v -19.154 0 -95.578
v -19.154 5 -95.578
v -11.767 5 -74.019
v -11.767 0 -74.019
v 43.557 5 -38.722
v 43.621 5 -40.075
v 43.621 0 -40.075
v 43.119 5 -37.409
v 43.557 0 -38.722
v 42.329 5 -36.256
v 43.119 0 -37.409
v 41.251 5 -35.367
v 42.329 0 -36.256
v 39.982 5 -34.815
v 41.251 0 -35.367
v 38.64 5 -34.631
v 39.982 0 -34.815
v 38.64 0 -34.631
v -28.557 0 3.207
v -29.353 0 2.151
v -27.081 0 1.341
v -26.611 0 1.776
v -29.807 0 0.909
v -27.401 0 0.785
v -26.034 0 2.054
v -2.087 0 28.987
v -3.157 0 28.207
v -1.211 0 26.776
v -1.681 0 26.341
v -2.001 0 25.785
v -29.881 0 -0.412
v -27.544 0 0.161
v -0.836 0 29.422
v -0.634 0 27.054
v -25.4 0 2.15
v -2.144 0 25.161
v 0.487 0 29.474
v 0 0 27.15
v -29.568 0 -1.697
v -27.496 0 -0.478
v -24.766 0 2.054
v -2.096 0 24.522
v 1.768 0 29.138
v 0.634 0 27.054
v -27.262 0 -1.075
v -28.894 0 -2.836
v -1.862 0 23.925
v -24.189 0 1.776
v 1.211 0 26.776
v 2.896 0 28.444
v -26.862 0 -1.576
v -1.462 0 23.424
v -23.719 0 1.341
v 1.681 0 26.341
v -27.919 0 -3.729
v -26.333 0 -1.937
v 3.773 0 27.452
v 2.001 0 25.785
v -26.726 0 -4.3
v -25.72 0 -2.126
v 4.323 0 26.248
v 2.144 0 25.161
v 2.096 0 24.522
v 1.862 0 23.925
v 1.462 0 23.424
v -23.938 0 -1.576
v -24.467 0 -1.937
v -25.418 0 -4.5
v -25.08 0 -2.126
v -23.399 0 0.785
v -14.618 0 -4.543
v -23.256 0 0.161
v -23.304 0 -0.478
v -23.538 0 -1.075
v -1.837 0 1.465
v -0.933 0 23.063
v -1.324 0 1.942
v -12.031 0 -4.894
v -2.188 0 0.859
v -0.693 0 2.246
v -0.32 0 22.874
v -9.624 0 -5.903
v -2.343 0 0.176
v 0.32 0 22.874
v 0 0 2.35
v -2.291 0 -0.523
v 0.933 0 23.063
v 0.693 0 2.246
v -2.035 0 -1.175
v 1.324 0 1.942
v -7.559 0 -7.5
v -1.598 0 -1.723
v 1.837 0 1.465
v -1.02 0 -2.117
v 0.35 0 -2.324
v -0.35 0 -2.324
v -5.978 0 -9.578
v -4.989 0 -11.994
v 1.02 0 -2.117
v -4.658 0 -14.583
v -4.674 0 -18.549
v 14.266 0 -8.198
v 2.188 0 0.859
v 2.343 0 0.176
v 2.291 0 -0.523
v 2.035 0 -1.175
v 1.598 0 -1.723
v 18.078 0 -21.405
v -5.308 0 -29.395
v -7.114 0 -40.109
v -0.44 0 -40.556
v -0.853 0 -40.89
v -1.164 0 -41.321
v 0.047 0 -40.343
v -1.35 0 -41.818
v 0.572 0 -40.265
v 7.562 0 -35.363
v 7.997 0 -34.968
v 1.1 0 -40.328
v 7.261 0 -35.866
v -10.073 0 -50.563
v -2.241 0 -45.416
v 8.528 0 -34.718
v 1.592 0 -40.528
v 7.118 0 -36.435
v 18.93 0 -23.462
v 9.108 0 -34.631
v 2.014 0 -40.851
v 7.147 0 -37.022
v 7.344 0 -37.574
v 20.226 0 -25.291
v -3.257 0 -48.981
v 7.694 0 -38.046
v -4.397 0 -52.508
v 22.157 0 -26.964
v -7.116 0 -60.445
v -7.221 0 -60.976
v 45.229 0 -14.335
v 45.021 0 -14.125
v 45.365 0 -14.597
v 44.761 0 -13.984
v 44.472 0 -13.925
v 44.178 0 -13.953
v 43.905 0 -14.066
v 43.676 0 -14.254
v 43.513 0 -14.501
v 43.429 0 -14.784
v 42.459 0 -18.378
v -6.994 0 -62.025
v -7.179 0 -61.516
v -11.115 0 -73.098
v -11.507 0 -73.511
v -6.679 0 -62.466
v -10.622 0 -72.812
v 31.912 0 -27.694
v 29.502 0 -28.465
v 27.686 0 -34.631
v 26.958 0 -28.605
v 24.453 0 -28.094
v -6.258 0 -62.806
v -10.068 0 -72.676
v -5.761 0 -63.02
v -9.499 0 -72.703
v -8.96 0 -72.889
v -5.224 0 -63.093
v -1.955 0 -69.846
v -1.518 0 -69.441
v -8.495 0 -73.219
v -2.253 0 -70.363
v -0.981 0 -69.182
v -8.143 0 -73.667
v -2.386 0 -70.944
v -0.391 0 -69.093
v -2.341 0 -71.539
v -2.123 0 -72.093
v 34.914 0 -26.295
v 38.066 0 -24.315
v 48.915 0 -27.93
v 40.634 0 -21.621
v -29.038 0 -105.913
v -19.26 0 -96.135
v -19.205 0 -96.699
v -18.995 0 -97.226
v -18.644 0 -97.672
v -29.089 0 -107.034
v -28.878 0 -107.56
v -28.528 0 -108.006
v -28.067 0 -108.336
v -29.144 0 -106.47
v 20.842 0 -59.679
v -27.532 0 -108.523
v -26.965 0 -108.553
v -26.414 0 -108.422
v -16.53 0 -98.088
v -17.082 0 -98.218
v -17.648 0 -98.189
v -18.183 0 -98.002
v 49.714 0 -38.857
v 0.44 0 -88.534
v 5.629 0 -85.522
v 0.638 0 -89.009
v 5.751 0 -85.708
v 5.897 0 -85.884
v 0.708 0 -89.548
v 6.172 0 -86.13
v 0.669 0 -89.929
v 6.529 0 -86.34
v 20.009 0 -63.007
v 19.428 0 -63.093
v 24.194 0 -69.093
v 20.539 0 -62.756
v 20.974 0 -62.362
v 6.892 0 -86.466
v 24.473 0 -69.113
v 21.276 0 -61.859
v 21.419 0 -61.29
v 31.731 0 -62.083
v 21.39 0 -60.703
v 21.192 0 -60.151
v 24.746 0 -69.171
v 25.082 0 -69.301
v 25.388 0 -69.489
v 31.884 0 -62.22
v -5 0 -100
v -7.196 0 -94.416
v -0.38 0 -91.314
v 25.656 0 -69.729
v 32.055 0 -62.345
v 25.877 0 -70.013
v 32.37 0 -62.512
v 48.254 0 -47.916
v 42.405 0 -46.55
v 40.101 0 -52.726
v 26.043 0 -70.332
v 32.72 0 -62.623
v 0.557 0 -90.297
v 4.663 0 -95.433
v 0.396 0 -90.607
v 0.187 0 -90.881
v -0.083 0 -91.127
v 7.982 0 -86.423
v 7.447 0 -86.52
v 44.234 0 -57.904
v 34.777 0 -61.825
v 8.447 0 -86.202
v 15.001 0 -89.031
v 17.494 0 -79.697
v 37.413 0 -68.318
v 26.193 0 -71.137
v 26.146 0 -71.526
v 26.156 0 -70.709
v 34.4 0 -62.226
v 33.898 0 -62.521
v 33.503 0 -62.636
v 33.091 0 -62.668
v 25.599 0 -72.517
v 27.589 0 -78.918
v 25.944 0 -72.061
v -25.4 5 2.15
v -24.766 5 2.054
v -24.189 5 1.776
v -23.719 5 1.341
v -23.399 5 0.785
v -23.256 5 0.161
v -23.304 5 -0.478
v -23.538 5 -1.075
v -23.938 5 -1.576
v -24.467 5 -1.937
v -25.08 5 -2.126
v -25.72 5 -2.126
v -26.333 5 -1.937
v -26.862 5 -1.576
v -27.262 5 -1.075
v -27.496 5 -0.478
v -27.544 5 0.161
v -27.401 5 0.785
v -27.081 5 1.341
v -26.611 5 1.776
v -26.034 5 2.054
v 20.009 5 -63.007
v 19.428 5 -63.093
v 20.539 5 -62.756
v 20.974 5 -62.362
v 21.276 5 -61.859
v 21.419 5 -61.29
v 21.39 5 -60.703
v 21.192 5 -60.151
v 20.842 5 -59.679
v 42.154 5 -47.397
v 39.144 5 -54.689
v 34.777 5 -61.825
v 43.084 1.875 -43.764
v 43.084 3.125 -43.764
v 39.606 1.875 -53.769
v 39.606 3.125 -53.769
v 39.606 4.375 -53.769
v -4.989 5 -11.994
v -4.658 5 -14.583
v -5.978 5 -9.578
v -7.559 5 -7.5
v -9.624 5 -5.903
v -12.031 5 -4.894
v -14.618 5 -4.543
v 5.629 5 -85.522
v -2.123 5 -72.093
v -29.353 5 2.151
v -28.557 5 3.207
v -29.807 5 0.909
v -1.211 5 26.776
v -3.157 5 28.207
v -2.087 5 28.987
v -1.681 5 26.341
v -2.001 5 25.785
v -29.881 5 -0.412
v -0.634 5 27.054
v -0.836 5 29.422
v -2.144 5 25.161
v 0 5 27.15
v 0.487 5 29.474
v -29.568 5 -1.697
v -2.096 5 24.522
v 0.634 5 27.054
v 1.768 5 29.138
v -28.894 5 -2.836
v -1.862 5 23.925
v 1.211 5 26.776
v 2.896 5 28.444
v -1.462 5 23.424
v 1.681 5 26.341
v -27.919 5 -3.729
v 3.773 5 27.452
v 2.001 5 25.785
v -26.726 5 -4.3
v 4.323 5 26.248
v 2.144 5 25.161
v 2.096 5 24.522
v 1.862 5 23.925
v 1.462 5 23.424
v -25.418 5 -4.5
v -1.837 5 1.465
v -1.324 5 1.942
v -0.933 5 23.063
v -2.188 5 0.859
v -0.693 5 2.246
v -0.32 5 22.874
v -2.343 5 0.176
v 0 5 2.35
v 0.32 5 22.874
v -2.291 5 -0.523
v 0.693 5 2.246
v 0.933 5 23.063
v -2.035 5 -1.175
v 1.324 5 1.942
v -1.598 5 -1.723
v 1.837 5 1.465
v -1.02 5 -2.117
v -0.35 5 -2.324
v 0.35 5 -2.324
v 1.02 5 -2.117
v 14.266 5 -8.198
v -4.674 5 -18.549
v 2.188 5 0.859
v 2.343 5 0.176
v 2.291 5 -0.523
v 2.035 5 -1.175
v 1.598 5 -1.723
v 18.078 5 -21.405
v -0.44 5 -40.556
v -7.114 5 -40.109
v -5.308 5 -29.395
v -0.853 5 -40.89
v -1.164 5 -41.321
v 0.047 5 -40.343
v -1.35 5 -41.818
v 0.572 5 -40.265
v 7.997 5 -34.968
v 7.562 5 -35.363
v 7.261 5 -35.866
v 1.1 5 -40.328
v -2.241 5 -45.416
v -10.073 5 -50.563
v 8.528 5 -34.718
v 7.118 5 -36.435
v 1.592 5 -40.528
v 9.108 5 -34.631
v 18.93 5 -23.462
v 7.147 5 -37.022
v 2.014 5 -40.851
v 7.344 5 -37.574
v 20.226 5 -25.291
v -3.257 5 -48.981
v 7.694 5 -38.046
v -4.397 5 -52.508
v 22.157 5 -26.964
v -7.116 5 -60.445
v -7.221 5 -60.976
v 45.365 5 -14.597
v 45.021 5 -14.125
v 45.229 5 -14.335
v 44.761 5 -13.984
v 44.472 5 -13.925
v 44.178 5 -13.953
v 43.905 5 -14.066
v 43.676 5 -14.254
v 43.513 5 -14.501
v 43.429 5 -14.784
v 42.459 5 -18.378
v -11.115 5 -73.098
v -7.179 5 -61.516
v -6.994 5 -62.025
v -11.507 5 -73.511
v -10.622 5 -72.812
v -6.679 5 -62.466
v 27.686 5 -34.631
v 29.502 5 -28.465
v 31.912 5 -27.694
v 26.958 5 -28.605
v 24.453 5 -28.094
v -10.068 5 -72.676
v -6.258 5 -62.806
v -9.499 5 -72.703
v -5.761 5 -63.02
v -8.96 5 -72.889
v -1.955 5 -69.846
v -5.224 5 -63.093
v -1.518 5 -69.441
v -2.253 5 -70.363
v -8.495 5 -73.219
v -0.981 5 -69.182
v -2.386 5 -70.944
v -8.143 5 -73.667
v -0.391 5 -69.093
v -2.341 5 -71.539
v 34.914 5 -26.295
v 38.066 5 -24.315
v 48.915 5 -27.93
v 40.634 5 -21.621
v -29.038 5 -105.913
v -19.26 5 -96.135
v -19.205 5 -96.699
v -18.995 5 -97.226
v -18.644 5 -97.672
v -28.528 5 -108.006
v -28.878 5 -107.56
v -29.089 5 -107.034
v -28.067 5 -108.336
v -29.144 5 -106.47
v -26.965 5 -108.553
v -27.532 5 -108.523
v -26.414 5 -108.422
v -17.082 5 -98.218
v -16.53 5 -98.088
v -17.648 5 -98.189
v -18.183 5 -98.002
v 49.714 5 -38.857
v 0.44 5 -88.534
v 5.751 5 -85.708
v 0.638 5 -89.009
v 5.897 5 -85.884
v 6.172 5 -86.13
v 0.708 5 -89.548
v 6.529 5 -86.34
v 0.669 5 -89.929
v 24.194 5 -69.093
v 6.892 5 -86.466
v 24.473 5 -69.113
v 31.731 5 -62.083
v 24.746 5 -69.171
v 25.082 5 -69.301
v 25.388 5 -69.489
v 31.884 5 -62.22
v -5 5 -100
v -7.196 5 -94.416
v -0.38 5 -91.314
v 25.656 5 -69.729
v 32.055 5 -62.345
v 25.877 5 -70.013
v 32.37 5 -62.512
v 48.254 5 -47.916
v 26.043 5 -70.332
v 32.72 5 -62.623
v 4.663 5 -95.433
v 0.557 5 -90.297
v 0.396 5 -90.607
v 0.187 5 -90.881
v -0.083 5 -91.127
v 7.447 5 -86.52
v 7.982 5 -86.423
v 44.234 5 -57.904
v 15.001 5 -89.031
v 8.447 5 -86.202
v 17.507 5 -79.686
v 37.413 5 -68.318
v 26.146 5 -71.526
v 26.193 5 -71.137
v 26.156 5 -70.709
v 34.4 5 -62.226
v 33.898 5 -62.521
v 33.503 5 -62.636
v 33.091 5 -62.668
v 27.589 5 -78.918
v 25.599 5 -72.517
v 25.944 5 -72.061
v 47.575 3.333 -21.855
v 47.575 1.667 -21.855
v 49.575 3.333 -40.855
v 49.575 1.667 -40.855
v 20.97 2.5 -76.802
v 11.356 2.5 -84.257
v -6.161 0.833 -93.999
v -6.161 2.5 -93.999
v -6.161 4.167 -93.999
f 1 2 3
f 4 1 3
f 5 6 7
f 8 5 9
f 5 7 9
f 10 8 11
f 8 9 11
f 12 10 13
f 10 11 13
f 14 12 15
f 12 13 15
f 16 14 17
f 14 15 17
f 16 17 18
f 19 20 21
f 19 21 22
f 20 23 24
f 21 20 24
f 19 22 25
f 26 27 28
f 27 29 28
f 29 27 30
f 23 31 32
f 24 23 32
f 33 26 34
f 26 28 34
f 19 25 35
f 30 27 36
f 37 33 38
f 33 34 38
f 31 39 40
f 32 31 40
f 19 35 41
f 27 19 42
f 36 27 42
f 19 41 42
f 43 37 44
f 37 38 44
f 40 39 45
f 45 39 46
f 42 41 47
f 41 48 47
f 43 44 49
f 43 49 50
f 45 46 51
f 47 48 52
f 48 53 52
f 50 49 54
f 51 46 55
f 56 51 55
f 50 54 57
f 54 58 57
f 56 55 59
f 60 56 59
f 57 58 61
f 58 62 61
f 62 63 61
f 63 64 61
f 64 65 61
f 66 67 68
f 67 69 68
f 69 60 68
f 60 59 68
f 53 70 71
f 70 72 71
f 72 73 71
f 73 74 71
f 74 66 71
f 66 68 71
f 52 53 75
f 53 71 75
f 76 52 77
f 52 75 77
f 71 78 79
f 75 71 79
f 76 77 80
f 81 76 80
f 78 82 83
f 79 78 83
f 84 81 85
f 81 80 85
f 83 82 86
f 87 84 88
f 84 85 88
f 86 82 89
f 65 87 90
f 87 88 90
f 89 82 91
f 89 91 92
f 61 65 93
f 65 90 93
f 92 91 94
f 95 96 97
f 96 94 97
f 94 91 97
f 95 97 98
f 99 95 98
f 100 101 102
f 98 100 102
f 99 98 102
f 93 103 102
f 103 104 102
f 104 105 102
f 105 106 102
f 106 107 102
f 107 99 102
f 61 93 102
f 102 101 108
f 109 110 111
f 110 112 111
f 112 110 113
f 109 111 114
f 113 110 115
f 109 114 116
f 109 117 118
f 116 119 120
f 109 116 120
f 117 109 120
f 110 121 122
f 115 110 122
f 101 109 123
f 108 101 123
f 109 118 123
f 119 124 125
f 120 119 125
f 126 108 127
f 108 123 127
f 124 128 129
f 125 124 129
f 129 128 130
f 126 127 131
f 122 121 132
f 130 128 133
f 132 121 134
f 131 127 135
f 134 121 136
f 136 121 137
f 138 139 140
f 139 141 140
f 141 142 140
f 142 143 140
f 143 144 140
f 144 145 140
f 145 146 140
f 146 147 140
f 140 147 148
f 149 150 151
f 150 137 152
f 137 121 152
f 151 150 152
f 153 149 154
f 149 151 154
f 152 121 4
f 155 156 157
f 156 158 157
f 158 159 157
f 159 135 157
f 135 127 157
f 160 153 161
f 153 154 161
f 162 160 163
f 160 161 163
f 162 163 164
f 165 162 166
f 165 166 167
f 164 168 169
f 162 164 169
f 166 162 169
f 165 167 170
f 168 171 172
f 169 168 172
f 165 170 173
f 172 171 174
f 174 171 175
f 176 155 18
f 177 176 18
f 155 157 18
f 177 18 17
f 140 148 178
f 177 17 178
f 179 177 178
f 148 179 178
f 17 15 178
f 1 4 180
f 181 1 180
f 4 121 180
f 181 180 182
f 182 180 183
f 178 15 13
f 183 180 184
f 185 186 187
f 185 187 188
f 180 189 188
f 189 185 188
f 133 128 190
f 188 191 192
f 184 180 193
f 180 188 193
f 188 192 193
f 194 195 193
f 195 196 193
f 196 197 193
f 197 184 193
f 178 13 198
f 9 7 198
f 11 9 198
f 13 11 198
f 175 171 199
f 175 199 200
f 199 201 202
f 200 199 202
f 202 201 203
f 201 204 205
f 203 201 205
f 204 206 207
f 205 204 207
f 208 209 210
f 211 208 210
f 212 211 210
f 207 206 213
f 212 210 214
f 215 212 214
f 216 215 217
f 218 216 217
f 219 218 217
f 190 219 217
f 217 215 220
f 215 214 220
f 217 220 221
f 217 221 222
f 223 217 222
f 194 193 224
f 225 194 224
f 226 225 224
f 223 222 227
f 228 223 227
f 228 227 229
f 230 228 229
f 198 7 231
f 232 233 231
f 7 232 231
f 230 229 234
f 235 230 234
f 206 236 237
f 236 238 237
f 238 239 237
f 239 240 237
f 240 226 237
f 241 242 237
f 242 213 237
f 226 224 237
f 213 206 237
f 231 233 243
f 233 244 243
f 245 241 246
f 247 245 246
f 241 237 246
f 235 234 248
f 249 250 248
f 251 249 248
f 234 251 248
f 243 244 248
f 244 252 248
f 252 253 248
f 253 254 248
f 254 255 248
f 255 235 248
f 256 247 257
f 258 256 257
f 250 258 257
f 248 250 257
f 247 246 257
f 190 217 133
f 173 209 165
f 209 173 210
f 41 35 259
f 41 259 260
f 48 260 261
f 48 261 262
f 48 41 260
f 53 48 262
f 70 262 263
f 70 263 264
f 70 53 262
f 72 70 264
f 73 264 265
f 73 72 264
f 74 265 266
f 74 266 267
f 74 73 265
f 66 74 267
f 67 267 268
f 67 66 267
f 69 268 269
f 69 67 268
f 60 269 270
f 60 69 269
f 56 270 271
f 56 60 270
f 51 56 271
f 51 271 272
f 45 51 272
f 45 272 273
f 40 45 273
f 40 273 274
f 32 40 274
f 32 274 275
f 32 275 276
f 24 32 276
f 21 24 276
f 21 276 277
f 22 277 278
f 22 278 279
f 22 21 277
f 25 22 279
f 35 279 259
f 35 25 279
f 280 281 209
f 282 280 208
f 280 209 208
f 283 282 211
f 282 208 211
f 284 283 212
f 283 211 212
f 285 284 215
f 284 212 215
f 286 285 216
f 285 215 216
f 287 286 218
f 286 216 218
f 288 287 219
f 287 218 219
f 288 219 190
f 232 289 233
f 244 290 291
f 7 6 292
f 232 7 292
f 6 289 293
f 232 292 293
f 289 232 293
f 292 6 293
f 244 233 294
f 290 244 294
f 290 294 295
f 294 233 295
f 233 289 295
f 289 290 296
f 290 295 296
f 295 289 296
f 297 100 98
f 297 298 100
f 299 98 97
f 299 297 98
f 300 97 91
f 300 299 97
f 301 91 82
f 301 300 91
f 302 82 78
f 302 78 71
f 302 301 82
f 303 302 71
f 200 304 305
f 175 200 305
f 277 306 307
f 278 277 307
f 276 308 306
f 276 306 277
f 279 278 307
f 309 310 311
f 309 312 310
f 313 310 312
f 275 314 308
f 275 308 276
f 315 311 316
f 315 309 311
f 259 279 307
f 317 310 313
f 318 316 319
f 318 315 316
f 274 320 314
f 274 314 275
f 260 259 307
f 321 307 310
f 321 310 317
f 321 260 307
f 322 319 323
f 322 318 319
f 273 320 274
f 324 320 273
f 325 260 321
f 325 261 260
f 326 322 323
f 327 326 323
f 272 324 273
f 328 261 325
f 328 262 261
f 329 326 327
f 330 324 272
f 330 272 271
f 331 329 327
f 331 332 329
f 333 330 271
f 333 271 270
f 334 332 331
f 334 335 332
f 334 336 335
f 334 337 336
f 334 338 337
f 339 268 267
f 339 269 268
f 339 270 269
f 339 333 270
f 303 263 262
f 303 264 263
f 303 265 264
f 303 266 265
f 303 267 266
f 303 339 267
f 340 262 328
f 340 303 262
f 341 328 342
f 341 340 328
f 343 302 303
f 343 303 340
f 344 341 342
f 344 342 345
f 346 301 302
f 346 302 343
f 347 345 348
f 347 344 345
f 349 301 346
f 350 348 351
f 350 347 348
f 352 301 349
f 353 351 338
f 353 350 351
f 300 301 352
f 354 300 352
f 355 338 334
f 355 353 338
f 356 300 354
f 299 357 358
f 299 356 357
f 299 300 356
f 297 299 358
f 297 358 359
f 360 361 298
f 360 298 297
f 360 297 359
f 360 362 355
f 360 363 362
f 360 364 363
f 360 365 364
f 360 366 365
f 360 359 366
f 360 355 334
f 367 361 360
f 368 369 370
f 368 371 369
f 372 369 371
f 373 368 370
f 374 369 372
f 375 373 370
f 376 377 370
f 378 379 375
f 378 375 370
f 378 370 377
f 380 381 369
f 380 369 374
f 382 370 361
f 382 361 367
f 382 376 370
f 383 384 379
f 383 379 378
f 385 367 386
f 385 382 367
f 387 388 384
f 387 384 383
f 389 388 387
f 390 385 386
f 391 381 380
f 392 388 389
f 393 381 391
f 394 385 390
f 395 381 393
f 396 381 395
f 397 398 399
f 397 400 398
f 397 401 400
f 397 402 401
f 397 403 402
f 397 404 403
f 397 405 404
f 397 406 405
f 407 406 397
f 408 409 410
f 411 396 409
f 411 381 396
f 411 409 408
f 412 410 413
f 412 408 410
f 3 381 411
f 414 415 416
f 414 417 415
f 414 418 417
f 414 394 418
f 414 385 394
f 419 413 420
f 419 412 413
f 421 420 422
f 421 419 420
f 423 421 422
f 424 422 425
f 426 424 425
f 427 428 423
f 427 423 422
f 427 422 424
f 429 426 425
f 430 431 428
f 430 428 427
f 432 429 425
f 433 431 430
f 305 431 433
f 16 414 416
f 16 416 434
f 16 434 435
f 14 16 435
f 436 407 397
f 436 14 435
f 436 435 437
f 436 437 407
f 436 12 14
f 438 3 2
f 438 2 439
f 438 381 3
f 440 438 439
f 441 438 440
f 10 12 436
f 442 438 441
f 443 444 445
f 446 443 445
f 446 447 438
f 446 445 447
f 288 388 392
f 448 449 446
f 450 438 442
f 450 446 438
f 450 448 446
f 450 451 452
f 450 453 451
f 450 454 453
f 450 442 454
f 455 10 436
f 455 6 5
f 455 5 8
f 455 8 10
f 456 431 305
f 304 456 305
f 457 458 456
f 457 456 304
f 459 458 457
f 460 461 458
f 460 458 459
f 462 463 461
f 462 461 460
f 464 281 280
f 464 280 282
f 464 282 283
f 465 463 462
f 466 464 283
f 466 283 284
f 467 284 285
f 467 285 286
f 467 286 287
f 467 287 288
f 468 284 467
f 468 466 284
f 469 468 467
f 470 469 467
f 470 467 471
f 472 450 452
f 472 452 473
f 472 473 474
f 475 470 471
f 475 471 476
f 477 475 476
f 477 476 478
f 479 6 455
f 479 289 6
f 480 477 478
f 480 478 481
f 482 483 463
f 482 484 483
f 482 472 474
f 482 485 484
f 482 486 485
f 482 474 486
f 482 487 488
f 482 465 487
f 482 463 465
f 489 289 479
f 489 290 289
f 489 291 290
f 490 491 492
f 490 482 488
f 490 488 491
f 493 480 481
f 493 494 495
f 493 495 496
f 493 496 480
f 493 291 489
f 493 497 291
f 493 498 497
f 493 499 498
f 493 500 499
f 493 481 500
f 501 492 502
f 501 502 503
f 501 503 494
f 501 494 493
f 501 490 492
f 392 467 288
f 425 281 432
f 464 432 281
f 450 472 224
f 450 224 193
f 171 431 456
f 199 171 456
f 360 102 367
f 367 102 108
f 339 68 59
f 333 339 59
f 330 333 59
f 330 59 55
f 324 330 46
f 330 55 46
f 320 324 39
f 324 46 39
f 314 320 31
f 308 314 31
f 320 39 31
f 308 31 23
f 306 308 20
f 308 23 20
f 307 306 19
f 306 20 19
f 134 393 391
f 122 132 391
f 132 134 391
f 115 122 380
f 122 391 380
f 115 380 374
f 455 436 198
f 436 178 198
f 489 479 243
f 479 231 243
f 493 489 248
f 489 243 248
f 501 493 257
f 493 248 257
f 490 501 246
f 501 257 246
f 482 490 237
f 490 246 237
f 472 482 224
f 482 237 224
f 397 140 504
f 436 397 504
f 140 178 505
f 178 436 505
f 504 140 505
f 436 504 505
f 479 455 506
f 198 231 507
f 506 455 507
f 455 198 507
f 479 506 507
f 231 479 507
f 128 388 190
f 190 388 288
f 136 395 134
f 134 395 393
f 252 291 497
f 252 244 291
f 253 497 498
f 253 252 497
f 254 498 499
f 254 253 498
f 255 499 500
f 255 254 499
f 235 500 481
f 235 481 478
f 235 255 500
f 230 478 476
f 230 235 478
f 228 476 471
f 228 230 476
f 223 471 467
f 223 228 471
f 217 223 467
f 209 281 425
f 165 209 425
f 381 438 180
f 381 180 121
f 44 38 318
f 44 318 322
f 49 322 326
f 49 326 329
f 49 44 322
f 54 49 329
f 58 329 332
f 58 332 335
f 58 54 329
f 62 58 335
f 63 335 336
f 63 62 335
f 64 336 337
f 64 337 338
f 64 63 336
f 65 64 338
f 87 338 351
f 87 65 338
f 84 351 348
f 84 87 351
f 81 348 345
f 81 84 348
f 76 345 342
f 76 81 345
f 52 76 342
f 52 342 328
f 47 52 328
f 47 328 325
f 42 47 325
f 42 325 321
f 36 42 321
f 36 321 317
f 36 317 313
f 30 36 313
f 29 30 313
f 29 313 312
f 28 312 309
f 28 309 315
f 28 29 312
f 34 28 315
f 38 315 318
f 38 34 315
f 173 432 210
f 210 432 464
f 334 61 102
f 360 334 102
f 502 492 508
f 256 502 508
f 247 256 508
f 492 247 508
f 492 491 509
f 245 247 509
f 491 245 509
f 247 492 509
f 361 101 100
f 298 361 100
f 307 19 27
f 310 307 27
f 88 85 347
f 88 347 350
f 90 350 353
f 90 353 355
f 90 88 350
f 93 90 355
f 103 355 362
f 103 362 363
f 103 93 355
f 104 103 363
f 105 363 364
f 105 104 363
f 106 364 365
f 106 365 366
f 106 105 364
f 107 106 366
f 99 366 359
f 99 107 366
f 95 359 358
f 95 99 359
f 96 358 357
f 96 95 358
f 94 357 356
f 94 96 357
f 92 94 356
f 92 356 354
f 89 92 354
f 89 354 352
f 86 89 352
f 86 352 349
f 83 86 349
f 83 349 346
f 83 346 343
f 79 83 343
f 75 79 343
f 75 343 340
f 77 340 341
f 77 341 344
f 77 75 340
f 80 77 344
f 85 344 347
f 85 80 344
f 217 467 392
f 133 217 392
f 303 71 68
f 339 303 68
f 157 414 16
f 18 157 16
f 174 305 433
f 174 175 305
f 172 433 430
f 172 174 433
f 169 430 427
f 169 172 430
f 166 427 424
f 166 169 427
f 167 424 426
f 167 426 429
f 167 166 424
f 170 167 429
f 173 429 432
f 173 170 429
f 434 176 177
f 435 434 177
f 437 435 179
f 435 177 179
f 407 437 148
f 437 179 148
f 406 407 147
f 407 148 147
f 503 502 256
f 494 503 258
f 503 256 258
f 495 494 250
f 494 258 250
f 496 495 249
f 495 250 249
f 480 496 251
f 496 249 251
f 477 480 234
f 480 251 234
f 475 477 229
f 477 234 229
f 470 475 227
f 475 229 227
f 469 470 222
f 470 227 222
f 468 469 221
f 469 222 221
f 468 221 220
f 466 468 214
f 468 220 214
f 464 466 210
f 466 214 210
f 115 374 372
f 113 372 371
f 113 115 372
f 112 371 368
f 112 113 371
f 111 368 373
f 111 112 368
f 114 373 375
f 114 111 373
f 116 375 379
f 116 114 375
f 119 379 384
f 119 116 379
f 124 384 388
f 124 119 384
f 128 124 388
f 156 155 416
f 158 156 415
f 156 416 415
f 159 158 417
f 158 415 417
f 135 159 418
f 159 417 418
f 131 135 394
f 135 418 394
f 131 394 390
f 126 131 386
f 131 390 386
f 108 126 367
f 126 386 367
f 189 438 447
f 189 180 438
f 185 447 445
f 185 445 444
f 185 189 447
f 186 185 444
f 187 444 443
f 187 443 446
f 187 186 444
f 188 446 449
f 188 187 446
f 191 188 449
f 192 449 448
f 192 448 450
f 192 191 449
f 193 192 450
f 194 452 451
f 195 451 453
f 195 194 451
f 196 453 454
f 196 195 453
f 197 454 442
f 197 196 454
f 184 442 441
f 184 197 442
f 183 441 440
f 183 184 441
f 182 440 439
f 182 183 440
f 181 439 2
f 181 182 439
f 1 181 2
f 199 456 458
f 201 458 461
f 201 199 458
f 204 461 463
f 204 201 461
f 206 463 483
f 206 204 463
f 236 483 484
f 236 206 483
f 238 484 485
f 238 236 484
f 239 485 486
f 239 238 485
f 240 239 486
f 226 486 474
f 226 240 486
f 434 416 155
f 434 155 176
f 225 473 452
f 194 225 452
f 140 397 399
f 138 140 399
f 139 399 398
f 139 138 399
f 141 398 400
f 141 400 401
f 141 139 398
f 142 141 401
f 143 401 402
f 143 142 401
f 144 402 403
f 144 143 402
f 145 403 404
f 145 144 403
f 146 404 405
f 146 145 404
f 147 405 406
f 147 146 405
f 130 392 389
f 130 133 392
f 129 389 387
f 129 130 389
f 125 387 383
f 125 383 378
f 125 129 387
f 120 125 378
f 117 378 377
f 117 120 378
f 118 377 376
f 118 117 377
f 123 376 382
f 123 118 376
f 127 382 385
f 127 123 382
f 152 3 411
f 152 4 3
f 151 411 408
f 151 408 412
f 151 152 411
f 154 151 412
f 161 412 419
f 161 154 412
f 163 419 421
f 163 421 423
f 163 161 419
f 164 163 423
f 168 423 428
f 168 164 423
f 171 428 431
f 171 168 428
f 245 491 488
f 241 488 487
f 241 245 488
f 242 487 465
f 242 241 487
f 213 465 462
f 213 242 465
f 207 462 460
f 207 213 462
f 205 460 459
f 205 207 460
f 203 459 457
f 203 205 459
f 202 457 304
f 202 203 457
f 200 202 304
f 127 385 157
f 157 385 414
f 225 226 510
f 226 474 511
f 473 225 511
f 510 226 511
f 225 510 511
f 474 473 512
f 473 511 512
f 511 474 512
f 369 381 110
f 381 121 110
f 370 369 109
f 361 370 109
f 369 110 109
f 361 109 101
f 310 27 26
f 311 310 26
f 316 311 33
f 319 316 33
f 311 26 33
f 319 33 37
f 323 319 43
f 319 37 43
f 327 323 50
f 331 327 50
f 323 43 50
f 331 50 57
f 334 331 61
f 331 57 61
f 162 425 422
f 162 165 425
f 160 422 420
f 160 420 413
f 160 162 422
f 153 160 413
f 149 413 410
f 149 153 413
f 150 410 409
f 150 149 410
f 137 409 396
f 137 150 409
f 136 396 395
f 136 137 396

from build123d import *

# Parameters (mm, degrees)
SKETCH1_R           = 2.35
SKETCH1_R_2         = 2.15
BOSS_EXTRUDE1_DEPTH = 5
BOSS_EXTRUDE2_DEPTH = 5
FILLET9_START       = -1
FILLET9_DEPTH       = 7
FILLET10_R          = 10
FILLET11_R          = 10
FILLET12_R          = 2
FILLET13_R          = 100
CUT_EXTRUDE1_DEPTH  = 10
FILLET16_R          = 2
FILLET17_R          = 5


with BuildPart() as part:
    # Sketch1 → Boss-Extrude1 (new body)
    # profile 1 of 5: a face of its own
    with BuildSketch(Plane(origin=(0, 0, 0), x_dir=(1, 0, 0), z_dir=(0, 1, 0))):
        with BuildLine():
            Line((21.319657121, 32.633890732), (34.914273926, 26.294616806))
            ThreePointArc((34.914273926, 26.294616806), (41.225871687, 20.759494125), (43.575, 12.7))
            ThreePointArc((43.575, 12.7), (43.275555611, 9.717775204), (42.389178035, 6.854618472))
            add(Edge.make_bspline(
                [(42.389178035, 6.854618472), (44.342966782, 11.471936513), (48.441890724, 22.813367807), (54.26521217, 62.473053577), (15.464484864, 91.951031047), (-5, 100)],
                knots=[0, 0, 0, 0, 0.134757694, 0.296973126, 1, 1, 1, 1], degree=3))
            Line((-5, 100), (-4.618360102, 4.58315657))
            Line((-4.618360102, 4.58315657), (-4.499964006, -25.01799856))
            ThreePointArc((-4.499964006, -25.01799856), (-0.008999298, -20.500008999), (4.5, -25))
            ThreePointArc((4.5, -25), (4.455654175, -25.630195106), (4.323490724, -26.247969535))
            Line((4.323490724, -26.247969535), (14.266400512, 8.198446858))
            ThreePointArc((14.266400512, 8.198446858), (14.163364253, 16.859898449), (18.866215247, 24.134137424))
            Line((18.866215247, 24.134137424), (21.319657121, 32.633890732))
        make_face()
        with Locations(Location((0, 0, 0), (0, 0, 270))):
            Circle(SKETCH1_R, mode=Mode.SUBTRACT)
    # profile 2 of 5: a face of its own
    with BuildSketch(Plane(origin=(0, 0, 0), x_dir=(1, 0, 0), z_dir=(0, 1, 0))):
        with BuildLine():
            Line((14.266400512, 8.198446858), (18.866215247, 24.134137424))
            ThreePointArc((18.866215247, 24.134137424), (14.163364253, 16.859898449), (14.266400512, 8.198446858))
        make_face()
    # profile 3 of 5: a face of its own
    with BuildSketch(Plane(origin=(0, 0, 0), x_dir=(1, 0, 0), z_dir=(0, 1, 0))):
        with BuildLine():
            ThreePointArc((-3.156627288, -28.207133325), (1.140163698, -29.353162843), (4.323490724, -26.247969535))
            ThreePointArc((4.323490724, -26.247969535), (4.455654175, -25.630195106), (4.5, -25))
            ThreePointArc((4.5, -25), (-0.008999298, -20.500008999), (-4.499964006, -25.01799856))
            ThreePointArc((-4.499964006, -25.01799856), (-4.147106545, -26.746856406), (-3.156627288, -28.207133325))
        make_face()
        with Locations(Location((0, -25, 0), (0, 0, 270))):
            Circle(SKETCH1_R_2, mode=Mode.SUBTRACT)
    # profile 4 of 5: a face of its own
    with BuildSketch(Plane(origin=(0, 0, 0), x_dir=(1, 0, 0), z_dir=(0, 1, 0))):
        with BuildLine():
            Line((-4.499964006, -25.01799856), (-4.618360102, 4.58315657))
            Line((-4.618360102, 4.58315657), (-25.41799856, 4.499964006))
            ThreePointArc((-25.41799856, 4.499964006), (-22.224389312, 3.188337617), (-20.9, 0))
            ThreePointArc((-20.9, 0), (-23.661440653, -4.150591693), (-28.556627288, -3.207133325))
            Line((-28.556627288, -3.207133325), (-3.156627288, -28.207133325))
            ThreePointArc((-3.156627288, -28.207133325), (-4.147106545, -26.746856406), (-4.499964006, -25.01799856))
        make_face()
    # profile 5 of 5: a face of its own
    with BuildSketch(Plane(origin=(0, 0, 0), x_dir=(1, 0, 0), z_dir=(0, 1, 0))):
        with BuildLine():
            ThreePointArc((-20.9, 0), (-22.224389312, 3.188337617), (-25.41799856, 4.499964006))
            ThreePointArc((-25.41799856, 4.499964006), (-29.567661171, 1.69723315), (-28.556627288, -3.207133325))
            ThreePointArc((-28.556627288, -3.207133325), (-23.661440653, -4.150591693), (-20.9, 0))
        make_face()
        with Locations(Location((-25.4, 0, 0), (0, 0, 270))):
            Circle(SKETCH1_R_2, mode=Mode.SUBTRACT)
    extrude(amount=BOSS_EXTRUDE1_DEPTH)

    # Sketch2 → Boss-Extrude2 (add, through all)
    with BuildSketch(Plane(origin=(0, 5, 0), x_dir=(1, 0, 0), z_dir=(0, 1, 0))):
        Polygon((-5, 100), (-30.440224277, 110.005997059), (-4.740018717, 35), align=None)
    extrude(amount=-BOSS_EXTRUDE2_DEPTH)

    # Fillet9: read off the stored shape, not the designer's step
    # Fillet9 outline → Fillet9 (cut)
    with BuildSketch(Plane(origin=(0, 0, 0), x_dir=(1, 0, 0), z_dir=(0, 1, 0)).offset(FILLET9_START)):
        with BuildLine():
            add(Edge.make_bspline(
                [(42.389178035, 6.854618472), (43.427373548, 9.308148252), (44.439078816, 11.911072083), (45.365164545, 14.597488782)],
                knots=[0, 0, 0, 0, 0.07160694, 0.07160694, 0.07160694, 0.07160694], degree=3))
            ThreePointArc((45.365164545, 14.597488782), (44.323632558, 13.928027401), (43.429465164, 14.784433901))
            ThreePointArc((43.429465164, 14.784433901), (43.447567664, 10.748915407), (42.389178035, 6.854618472))
        make_face()
    extrude(amount=FILLET9_DEPTH, mode=Mode.SUBTRACT)

    # Fillet10
    fillet10_edges = [part.edges().sort_by_distance(p)[0] for p in [
        (21.319657121, 2.5, -32.633890732),
    ]]
    fillet(fillet10_edges, radius=FILLET10_R)

    # Fillet11
    fillet11_edges = [part.edges().sort_by_distance(p)[0] for p in [
        (-4.618360102, 2.5, -4.58315657),
    ]]
    fillet(fillet11_edges, radius=FILLET11_R)

    # Fillet12
    fillet12_edges = [part.edges().sort_by_distance(p)[0] for p in [
        (-30.440224277, 2.5, -110.005997059),
    ]]
    fillet(fillet12_edges, radius=FILLET12_R)

    # Fillet13
    fillet13_edges = [part.edges().sort_by_distance(p)[0] for p in [
        (-4.740018717, 2.5, -35),
    ]]
    fillet(fillet13_edges, radius=FILLET13_R)

    # Sketch3 → Cut-Extrude1 (cut)
    with BuildSketch(Plane(origin=(0, 5, 0), x_dir=(1, 0, 0), z_dir=(0, 1, 0))):
        with BuildLine():
            Line((-7.196124056, 94.416359688), (-20.556666638, 99.671248494))
            Line((-20.556666638, 99.671248494), (-10.34167973, 69.858830216))
            Line((-10.34167973, 69.858830216), (1.479992408, 90.33456699))
            add(Edge.make_bspline(
                [(1.479992408, 90.33456699), (1.28397872, 90.440564461), (0.569604437, 90.823664357), (-0.911069003, 91.59331249), (-2.926185163, 92.579659505), (-4.750200244, 93.404717974), (-6.168292078, 94.005080785), (-6.85002115, 94.280232561), (-7.196124056, 94.416359688)],
                knots=[0.899537877, 0.899537877, 0.899537877, 0.899537877, 0.905955438, 0.922989268, 0.948659512, 0.974329756, 0.987164878, 1, 1, 1, 1], degree=3))
        make_face()
        with BuildLine():
            add(Edge.make_bspline(
                [(28.891913577, 69.093470772), (28.667354165, 69.339735814), (26.185201557, 72.030266697), (22.009276054, 76.029258723), (16.240637184, 80.752486943), (11.640954059, 84.113026779), (8.44218135, 86.220773941), (6.886134042, 87.191294266), (6.670477462, 87.324750819)],
                knots=[0.599769047, 0.599769047, 0.599769047, 0.599769047, 0.608173487, 0.691957071, 0.743297559, 0.794638047, 0.837083391, 0.84392152, 0.84392152, 0.84392152, 0.84392152], degree=3))
            Line((6.670477462, 87.324750819), (-3.855356981, 69.093470772))
            Line((-3.855356981, 69.093470772), (28.891913577, 69.093470772))
        make_face()
        with BuildLine():
            Line((24.256703875, 63.093470772), (-8.023583375, 63.093470772))
            Line((-8.023583375, 63.093470772), (-4.396532038, 52.507928907))
            ThreePointArc((-4.396532038, 52.507928907), (-2.247165573, 45.44102658), (-0.595170682, 38.241596216))
            Line((-0.595170682, 38.241596216), (24.256703875, 63.093470772))
        make_face()
        with BuildLine():
            add(Edge.make_bspline(
                [(43.683908276, 34.631385763), (43.696866831, 34.851470147), (43.767861036, 36.240626578), (43.768636498, 39.331228462), (43.211809078, 43.755898325), (41.817266975, 48.782881707), (39.714268813, 53.778597693), (37.032666408, 58.583202787), (34.774401672, 61.875598877), (33.528556835, 63.529710734), (33.377122853, 63.728608376)],
                knots=[0.24062608, 0.24062608, 0.24062608, 0.24062608, 0.247043641, 0.281233166, 0.332573654, 0.383914142, 0.43525463, 0.486595118, 0.533806823, 0.540275717, 0.540275717, 0.540275717, 0.540275717], degree=3))
            Line((33.377122853, 63.728608376), (4.279900241, 34.631385764))
            Line((4.279900241, 34.631385764), (27.686110097, 34.631385764))
            Line((27.686110097, 34.631385764), (43.683908276, 34.631385763))
        make_face()
    extrude(amount=-CUT_EXTRUDE1_DEPTH, mode=Mode.SUBTRACT)

    # Fillet16
    fillet16_edges = [part.edges().sort_by_distance(p)[0] for p in [
        (33.377122853, 2.5, -63.728608376),
        (-20.556666638, 2.5, -99.671248494),
        (-10.34167973, 2.5, -69.858830216),
        (1.479992408, 2.5, -90.33456699),
        (6.670477462, 2.5, -87.324750819),
        (-3.855356981, 2.5, -69.093470772),
        (28.891913577, 2.5, -69.093470772),
        (-8.023583375, 2.5, -63.093470772),
        (-0.595170682, 2.5, -38.241596216),
        (24.256703875, 2.5, -63.093470772),
        (4.279900241, 2.5, -34.631385764),
    ]]
    fillet(fillet16_edges, radius=FILLET16_R)

    # Fillet17
    fillet17_edges = [part.edges().sort_by_distance(p)[0] for p in [
        (43.683908276, 2.5, -34.631385763),
    ]]
    fillet(fillet17_edges, radius=FILLET17_R)


solid = part.part
